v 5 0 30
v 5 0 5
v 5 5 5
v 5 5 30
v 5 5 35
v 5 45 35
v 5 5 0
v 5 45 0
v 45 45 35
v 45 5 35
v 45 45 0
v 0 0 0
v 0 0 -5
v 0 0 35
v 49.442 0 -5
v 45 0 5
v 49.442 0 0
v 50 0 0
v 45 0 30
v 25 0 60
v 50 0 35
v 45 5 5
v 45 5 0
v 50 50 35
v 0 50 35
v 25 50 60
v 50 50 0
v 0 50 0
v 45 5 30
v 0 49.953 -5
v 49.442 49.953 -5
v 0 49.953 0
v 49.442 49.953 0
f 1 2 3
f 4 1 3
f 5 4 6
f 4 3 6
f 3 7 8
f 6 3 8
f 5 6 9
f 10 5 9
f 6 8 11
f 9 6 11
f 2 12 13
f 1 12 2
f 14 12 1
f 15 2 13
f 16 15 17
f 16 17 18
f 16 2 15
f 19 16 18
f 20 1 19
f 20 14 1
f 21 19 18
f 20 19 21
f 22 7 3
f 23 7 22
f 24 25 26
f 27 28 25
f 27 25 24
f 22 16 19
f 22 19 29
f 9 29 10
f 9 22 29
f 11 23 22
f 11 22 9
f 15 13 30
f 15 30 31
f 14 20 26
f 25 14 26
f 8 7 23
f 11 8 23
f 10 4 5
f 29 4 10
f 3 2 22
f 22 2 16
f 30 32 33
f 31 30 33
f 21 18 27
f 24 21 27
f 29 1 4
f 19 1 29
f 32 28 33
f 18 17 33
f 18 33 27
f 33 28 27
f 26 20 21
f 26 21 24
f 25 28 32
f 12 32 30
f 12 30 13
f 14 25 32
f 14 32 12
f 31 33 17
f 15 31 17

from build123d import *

# Parameters (mm, degrees)
F0_W     = 50
F0_H     = 50
F0_W_2   = 40
F0_H_2   = 40
F1_DEPTH = 35
F2_W     = 50
F2_H     = 50
F3_DEPTH = 25
F4_SIZE  = 24.99999
F5_W     = 40
F5_H     = 25
F6_DEPTH = 35
F8_W     = 49.4415648282
F8_H     = 49.9527305365
F9_DEPTH = 5


# Not quite as in the source:
# - a fillet or chamfer is up to 0.001 mm smaller than in the source, because OpenCascade refuses the exact size


with BuildPart() as f1:
    # F0 (on Top) → F1 (new body)
    with BuildSketch(Plane.XY):
        with Locations((25, 25)):
            Rectangle(F0_W, F0_H)
        with Locations((25, 25)):
            Rectangle(F0_W_2, F0_H_2, mode=Mode.SUBTRACT)
    extrude(amount=F1_DEPTH)

    # F2 (on face) → F3 (join)
    with BuildSketch(Plane.XY.offset(35)):
        with Locations((25, 25)):
            Rectangle(F2_W, F2_H)
    extrude(amount=F3_DEPTH)

    # F4 (size 25 in the source; OpenCascade refuses exactly that, so slightly less here)
    f4_edges = [f1.edges().sort_by_distance(p)[0] for p in [
        (0, 25, 60),
        (50, 25, 60),
    ]]
    chamfer(f4_edges, length=F4_SIZE)

    # F5 (on face) → F6 (cut)
    with BuildSketch(Plane.XZ):
        with Locations((25, 17.5)):
            Rectangle(F5_W, F5_H)
    extrude(amount=-F6_DEPTH, mode=Mode.SUBTRACT)

    # F8 (on face) → F9 (join)
    with BuildSketch(Plane(origin=(0, 0, 0), x_dir=(1, 0, 0), z_dir=(0, 0, -1))):
        with Locations((24.7207824141, -24.9763652682)):
            Rectangle(F8_W, F8_H)
    extrude(amount=F9_DEPTH)


solid = f1.part
